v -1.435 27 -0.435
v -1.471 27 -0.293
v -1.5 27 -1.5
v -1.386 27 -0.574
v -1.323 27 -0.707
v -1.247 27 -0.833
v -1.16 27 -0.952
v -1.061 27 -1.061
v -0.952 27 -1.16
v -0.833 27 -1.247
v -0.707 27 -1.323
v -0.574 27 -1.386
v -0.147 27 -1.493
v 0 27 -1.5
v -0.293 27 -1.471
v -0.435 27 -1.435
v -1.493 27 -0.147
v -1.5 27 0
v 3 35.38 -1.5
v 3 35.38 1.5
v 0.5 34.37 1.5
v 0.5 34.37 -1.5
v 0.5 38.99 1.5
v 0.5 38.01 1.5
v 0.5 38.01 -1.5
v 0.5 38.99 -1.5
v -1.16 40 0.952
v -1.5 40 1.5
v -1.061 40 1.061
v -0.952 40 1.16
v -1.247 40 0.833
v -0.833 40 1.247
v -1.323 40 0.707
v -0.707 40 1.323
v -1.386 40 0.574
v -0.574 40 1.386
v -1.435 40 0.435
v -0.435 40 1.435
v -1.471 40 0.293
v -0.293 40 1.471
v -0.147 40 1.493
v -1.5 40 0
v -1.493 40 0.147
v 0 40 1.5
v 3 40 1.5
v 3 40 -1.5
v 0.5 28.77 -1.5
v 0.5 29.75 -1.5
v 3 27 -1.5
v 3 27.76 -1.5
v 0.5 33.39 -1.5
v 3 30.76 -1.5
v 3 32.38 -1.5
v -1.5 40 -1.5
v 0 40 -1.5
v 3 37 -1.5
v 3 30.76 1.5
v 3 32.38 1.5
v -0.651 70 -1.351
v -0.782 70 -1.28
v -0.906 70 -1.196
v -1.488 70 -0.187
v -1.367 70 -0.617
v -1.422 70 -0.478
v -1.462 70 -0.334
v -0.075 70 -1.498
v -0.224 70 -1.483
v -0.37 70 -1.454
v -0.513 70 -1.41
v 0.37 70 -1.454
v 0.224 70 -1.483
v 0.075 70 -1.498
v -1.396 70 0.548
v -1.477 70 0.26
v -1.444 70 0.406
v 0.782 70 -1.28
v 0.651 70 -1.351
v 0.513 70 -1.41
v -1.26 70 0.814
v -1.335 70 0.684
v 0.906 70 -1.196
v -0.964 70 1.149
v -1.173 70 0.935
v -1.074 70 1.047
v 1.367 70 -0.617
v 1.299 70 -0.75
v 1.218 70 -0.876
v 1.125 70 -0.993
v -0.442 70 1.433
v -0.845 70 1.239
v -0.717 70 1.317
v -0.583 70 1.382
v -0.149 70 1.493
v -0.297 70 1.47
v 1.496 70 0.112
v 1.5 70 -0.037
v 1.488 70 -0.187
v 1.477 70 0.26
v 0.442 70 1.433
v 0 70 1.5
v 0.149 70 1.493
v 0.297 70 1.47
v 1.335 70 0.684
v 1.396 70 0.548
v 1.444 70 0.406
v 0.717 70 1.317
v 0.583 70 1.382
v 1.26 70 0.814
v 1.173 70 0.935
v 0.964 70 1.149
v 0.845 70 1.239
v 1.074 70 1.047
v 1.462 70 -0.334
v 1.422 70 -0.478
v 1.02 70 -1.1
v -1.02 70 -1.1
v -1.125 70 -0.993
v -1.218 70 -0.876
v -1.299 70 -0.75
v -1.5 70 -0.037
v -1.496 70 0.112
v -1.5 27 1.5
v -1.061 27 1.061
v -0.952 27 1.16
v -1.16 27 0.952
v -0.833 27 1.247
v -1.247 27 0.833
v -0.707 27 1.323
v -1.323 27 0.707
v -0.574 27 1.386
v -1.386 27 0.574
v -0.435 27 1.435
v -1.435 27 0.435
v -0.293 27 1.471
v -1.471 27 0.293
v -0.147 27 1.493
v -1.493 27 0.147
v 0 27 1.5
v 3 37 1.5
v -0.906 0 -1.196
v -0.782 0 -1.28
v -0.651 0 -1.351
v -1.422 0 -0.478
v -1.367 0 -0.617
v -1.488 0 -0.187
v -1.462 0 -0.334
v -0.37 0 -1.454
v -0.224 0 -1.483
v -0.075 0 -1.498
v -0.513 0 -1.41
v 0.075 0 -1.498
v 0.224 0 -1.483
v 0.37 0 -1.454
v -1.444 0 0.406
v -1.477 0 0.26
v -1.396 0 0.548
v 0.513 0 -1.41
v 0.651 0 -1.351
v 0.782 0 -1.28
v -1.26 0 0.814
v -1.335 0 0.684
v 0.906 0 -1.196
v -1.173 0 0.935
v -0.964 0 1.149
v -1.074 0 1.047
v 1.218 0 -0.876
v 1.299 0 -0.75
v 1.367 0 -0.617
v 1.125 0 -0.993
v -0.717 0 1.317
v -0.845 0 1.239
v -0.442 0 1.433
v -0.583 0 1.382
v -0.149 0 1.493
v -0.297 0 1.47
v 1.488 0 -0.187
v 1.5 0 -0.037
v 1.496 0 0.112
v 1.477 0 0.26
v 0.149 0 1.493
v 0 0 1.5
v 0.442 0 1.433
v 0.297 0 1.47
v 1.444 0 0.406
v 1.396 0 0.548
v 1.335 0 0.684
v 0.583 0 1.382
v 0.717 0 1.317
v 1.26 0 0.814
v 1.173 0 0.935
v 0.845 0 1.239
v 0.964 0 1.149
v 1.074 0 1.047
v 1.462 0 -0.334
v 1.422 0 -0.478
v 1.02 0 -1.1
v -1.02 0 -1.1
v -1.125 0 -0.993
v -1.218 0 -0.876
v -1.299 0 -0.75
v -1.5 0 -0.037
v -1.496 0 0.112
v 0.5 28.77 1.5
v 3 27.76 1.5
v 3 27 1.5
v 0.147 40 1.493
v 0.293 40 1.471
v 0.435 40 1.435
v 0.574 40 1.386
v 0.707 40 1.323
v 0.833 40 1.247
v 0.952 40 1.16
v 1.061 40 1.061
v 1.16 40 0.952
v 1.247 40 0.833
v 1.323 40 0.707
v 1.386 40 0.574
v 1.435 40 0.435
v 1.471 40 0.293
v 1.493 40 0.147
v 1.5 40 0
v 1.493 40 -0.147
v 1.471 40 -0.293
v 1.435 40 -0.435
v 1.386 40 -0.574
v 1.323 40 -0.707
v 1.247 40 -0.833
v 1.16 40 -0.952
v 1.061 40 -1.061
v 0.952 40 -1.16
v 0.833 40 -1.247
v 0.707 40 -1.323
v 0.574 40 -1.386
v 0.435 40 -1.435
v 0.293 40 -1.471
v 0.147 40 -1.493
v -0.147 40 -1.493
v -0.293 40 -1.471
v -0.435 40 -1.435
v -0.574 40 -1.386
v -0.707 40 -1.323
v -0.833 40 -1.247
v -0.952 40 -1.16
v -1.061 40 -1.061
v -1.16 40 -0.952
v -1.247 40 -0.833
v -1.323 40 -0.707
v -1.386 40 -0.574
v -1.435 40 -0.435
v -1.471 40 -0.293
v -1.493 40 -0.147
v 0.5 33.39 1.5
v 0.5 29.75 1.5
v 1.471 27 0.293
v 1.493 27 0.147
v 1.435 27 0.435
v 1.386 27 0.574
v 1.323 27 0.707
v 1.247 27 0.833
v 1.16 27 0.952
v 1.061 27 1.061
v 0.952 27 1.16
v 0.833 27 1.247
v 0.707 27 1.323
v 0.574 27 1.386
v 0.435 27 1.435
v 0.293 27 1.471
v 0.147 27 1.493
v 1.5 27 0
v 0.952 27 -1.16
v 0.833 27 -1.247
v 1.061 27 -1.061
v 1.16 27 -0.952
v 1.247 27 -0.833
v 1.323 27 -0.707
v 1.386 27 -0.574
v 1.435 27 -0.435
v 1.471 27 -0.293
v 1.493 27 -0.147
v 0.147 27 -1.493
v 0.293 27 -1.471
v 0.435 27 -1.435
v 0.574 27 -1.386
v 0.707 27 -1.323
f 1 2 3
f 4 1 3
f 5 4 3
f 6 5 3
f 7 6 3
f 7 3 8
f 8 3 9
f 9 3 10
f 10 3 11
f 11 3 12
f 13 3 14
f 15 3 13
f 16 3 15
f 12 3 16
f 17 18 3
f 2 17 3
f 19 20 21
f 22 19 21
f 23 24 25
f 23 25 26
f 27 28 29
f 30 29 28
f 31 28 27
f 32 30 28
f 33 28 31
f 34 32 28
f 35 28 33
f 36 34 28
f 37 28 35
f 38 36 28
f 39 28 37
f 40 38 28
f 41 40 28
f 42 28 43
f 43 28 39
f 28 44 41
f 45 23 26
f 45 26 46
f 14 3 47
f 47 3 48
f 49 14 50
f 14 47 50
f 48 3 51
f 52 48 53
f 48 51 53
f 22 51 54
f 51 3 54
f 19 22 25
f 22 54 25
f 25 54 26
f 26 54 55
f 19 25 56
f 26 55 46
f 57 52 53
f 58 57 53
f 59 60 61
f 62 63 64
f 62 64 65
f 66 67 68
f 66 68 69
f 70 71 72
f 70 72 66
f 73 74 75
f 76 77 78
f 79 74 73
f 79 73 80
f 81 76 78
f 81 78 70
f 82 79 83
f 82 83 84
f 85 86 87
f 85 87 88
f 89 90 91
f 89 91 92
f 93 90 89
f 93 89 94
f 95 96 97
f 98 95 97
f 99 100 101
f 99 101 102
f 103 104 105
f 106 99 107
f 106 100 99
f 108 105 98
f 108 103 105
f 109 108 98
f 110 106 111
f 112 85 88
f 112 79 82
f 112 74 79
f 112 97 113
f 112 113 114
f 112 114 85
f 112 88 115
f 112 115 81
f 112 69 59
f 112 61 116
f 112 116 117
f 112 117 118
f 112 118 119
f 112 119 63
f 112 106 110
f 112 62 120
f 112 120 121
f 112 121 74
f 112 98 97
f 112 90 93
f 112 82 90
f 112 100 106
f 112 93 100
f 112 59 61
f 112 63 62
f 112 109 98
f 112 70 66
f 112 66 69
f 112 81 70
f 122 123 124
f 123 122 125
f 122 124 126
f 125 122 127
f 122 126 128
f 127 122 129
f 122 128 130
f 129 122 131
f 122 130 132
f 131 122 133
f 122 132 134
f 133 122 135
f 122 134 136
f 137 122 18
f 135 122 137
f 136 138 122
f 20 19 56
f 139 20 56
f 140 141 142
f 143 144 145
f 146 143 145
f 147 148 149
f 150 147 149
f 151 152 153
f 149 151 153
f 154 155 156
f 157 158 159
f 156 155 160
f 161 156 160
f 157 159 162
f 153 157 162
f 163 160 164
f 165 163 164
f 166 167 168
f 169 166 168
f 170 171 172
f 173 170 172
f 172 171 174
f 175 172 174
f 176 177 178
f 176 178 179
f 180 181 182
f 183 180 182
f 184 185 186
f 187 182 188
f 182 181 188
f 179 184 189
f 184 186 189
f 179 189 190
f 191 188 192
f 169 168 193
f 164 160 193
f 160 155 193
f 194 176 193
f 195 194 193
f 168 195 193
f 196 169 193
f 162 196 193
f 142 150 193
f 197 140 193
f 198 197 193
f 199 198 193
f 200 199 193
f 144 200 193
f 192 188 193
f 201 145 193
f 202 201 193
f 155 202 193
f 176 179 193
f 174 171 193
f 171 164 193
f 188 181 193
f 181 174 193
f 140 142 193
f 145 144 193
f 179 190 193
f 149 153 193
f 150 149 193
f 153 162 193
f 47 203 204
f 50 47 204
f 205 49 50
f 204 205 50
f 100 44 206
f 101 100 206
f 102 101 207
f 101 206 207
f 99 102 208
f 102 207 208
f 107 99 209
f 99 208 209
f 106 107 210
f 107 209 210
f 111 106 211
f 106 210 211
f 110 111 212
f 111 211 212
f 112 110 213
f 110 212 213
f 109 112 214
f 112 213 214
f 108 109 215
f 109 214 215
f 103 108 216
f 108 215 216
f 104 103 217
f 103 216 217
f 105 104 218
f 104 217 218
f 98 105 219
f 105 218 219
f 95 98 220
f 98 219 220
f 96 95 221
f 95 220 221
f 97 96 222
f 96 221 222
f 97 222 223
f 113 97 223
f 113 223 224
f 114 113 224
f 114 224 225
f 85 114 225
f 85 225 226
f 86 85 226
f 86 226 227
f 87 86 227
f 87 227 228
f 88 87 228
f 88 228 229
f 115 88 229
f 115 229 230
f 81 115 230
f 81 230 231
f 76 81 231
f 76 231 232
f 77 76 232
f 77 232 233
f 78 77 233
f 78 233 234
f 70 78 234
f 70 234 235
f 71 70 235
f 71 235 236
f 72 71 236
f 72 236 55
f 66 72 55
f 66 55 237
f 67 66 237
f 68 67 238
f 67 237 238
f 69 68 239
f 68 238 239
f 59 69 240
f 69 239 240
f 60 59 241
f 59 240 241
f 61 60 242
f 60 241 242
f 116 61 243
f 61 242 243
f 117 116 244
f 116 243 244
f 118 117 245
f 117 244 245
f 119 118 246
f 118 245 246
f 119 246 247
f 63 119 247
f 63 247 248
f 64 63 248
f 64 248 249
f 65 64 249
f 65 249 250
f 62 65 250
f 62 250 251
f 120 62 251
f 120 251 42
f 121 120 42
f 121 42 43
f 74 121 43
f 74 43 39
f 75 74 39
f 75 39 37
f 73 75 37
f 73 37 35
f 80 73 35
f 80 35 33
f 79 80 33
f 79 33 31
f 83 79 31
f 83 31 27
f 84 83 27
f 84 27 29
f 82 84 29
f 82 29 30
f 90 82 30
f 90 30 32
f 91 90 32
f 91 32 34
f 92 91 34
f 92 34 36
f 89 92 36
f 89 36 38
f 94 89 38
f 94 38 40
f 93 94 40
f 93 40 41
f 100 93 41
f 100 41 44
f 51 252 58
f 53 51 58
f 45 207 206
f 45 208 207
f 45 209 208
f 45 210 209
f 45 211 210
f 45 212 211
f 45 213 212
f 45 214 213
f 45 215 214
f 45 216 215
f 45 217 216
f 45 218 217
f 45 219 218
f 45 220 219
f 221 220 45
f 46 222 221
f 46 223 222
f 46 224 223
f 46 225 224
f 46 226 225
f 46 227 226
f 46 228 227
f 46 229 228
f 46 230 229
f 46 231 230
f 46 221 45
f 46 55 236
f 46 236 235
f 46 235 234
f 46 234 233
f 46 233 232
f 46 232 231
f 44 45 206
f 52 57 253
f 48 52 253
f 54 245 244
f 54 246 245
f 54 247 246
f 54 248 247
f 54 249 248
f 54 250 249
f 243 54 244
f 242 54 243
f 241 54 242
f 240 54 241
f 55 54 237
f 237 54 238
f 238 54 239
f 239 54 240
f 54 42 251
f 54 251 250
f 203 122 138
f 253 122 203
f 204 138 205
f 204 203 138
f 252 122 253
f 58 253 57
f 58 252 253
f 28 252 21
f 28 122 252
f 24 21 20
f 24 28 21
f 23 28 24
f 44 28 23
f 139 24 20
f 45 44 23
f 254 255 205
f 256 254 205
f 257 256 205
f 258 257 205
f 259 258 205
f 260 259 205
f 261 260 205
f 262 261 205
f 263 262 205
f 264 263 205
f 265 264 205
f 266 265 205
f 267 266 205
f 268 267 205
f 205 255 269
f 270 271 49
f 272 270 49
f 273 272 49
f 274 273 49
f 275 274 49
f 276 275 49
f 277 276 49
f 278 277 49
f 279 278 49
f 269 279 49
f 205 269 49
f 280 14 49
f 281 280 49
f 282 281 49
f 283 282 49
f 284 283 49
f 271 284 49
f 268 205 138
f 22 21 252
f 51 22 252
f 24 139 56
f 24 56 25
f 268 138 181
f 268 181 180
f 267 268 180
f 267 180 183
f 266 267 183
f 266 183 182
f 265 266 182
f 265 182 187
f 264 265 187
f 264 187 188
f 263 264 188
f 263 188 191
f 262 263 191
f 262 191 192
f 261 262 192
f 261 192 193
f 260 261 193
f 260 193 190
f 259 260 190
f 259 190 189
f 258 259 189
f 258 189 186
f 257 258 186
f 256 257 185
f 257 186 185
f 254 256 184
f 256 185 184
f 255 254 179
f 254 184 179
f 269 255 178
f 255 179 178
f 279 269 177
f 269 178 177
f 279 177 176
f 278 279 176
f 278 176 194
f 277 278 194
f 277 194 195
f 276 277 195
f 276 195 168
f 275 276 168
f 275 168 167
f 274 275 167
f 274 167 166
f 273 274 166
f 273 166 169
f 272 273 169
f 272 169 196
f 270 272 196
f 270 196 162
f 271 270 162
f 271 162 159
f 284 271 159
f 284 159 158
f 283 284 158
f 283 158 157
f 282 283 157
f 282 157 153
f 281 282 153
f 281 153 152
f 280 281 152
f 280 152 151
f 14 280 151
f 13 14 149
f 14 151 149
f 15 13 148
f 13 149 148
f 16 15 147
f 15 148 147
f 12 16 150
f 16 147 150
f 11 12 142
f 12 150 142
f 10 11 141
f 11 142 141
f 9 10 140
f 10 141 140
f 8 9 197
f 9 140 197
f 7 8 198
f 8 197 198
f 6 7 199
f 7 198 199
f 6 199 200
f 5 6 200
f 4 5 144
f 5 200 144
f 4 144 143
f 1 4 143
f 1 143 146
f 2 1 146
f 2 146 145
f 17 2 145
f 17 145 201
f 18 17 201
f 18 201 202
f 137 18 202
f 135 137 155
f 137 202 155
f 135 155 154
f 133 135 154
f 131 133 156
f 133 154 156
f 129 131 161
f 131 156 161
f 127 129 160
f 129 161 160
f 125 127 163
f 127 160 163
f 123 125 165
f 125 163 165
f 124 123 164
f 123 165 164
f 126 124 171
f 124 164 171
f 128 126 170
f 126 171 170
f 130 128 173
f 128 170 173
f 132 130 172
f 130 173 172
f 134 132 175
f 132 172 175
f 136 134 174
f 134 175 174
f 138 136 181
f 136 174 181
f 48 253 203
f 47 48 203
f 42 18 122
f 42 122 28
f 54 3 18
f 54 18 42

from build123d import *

# Parameters (mm, degrees)
SKETCH1_R                = 1.5
BOSS_EXTRUDE1_DEPTH      = 40
BOSS_EXTRUDE2_DEPTH      = 1.5
BOSS_EXTRUDE2_DEPTH_BACK = 1.5
SKETCH6_W                = 4.5
SKETCH6_H                = 13
CUT_EXTRUDE2_DEPTH       = 4
SKETCH13_R               = 1.5
BOSS_EXTRUDE3_DEPTH      = 30


with BuildPart() as part:
    # Sketch1 → Boss-Extrude1 (new body)
    with BuildSketch(Plane(origin=(0, 0, 0), x_dir=(1, 0, 0), z_dir=(0, 1, 0))):
        Circle(SKETCH1_R)
    extrude(amount=BOSS_EXTRUDE1_DEPTH)

    # Sketch6 → Boss-Extrude2 (add, two sides: drawn at the far end of the back side and taken through both)
    with BuildSketch(Plane.XY.offset(-BOSS_EXTRUDE2_DEPTH_BACK)):
        with Locations((0.75, 33.5)):
            Rectangle(SKETCH6_W, SKETCH6_H)
    extrude(amount=BOSS_EXTRUDE2_DEPTH + BOSS_EXTRUDE2_DEPTH_BACK)

    # Sketch12 → Cut-Extrude2 (cut)
    with BuildSketch(Plane.XY.offset(1.5)):
        Polygon((3, 40), (3, 37), (0.5, 38.010065565), (0.5, 38.989934435), align=None)
        Polygon((0.5, 34.369934435), (0.5, 33.390065565), (3, 32.38), (3, 35.38), align=None)
        Polygon((0.5, 29.749934435), (0.5, 28.770065565), (3, 27.76), (3, 30.76), align=None)
    extrude(amount=-CUT_EXTRUDE2_DEPTH, mode=Mode.SUBTRACT)

    # Sketch13 → Boss-Extrude3 (add)
    with BuildSketch(Plane(origin=(0, 40, 0), x_dir=(1, 0, 0), z_dir=(0, 1, 0))):
        Circle(SKETCH13_R)
    extrude(amount=BOSS_EXTRUDE3_DEPTH)


solid = part.part
